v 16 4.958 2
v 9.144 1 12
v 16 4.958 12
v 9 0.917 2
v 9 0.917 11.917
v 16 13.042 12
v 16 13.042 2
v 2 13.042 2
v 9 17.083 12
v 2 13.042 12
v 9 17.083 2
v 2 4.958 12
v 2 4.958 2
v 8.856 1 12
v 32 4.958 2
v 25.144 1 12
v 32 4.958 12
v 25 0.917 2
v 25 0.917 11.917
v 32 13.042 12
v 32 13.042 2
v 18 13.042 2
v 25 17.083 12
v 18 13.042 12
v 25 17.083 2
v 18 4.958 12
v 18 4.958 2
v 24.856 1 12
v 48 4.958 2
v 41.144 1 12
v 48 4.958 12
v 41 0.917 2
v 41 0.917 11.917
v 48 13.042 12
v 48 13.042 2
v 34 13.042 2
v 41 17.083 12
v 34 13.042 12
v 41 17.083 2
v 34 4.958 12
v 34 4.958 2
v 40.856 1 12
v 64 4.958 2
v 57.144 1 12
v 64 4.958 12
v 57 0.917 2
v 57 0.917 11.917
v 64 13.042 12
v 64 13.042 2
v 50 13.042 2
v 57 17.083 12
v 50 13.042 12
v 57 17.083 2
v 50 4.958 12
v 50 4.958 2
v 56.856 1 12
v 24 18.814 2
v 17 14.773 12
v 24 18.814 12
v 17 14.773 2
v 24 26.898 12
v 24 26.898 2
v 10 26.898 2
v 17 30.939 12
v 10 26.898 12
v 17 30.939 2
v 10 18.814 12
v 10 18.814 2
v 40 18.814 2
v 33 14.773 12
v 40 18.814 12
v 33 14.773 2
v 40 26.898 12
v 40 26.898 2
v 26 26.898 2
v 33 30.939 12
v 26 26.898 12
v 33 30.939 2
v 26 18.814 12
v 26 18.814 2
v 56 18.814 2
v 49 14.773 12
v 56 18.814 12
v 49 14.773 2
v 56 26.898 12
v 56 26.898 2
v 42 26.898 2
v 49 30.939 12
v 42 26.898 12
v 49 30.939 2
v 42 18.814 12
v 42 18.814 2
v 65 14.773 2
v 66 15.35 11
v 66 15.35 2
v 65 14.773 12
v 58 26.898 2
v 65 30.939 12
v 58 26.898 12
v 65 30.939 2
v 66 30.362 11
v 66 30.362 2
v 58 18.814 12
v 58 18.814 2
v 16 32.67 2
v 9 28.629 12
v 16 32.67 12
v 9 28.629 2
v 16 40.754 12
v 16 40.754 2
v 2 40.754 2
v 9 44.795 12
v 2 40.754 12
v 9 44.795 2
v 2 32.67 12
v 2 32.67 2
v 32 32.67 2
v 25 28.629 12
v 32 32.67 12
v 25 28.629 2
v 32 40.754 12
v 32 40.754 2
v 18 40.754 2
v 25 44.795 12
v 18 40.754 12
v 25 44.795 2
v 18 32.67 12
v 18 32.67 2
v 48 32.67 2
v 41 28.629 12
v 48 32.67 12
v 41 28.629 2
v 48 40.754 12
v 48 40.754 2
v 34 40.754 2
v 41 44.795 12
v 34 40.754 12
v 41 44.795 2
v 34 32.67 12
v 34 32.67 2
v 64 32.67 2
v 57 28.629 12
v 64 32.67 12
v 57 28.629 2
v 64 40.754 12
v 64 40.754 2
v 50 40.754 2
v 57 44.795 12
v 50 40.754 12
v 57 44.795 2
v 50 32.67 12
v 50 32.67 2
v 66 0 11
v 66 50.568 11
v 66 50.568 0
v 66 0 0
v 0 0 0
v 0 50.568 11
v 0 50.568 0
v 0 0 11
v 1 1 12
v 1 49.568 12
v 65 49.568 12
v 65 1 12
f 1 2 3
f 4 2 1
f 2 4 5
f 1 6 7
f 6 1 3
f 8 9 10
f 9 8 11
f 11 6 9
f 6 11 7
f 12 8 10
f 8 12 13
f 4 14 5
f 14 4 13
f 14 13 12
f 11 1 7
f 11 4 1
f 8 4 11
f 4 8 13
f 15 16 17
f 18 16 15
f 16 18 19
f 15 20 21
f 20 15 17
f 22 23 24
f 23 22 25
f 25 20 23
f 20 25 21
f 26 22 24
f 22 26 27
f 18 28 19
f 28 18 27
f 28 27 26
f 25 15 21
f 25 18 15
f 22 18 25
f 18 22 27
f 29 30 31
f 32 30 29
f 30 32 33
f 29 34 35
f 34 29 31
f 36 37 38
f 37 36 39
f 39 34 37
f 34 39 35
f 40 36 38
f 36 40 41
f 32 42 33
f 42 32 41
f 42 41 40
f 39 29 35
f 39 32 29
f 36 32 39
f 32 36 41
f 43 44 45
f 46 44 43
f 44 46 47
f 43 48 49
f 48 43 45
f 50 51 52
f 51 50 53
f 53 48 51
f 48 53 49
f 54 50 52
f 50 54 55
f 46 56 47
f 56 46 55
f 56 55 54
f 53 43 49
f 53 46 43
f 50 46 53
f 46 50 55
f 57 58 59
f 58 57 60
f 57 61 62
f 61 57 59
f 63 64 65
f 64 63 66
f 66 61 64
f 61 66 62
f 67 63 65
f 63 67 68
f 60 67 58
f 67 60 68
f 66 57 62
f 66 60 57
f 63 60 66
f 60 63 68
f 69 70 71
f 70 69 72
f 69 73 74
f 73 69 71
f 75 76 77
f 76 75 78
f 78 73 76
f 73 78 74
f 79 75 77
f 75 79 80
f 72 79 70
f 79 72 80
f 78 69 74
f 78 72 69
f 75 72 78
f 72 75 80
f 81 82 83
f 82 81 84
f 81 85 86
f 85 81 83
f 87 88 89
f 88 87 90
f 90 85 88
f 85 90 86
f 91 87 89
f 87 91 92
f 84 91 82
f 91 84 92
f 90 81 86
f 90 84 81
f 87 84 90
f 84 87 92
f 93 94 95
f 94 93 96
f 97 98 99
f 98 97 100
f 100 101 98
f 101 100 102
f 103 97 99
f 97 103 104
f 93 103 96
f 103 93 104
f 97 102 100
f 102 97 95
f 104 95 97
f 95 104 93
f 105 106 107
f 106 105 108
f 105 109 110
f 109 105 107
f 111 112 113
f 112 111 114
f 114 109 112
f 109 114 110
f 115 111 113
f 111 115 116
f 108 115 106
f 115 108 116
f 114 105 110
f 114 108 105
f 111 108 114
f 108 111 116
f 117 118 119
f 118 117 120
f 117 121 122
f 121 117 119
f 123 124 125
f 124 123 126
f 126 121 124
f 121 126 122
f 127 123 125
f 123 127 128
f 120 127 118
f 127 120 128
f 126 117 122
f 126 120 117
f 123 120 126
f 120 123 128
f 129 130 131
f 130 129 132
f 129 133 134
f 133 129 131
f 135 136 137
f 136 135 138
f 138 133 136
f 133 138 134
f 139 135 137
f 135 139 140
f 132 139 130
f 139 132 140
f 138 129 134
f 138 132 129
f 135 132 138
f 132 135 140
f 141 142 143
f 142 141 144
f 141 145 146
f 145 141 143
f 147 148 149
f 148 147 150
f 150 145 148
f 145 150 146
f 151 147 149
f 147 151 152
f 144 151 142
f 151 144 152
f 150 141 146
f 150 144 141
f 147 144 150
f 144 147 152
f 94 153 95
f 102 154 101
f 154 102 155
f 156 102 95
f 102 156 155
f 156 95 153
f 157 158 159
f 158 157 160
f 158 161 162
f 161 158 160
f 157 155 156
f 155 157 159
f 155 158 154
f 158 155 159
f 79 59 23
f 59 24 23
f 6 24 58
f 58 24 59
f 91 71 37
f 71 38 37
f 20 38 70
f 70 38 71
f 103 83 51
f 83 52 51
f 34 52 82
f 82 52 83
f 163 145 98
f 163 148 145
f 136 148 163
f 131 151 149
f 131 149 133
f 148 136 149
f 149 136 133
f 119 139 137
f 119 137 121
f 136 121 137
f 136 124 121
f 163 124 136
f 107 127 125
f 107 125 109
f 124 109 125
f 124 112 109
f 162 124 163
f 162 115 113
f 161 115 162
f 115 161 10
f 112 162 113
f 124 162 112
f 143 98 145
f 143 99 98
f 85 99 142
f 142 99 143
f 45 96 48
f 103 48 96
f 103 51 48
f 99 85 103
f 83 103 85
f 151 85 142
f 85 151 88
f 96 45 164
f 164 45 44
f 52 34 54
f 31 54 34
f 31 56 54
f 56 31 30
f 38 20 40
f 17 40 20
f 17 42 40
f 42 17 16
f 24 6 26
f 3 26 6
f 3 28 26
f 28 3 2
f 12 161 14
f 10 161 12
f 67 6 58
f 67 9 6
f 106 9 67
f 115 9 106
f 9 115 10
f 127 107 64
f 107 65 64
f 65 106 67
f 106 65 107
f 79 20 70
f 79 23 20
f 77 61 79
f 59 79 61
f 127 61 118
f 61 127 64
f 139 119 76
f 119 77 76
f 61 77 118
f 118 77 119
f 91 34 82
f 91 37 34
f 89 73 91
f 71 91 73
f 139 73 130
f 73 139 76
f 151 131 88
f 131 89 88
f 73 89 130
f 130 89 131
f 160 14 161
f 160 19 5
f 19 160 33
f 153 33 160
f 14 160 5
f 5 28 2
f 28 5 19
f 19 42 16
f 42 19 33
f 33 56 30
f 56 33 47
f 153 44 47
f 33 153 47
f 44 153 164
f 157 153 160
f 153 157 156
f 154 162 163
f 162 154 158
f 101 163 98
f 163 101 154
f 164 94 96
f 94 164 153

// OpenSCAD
// A tray of hexagonal pockets for small parts. Plain OpenSCAD, no libraries.
cols = 4;
rows = 3;
across = 14;     // pocket across flats
depth = 10;
wall = 2;
floor_t = 2;
rim = 1;         // chamfer on the top edge

pitch_x = across + wall;
pitch_y = (across + wall) * 0.866;
size_x = cols * pitch_x + wall;
size_y = rows * pitch_y + across * 0.5 + wall;

module pocket() {
    rotate([0, 0, 30]) cylinder(d = across / 0.866, h = depth + 1, $fn = 6);
}

difference() {
    hull() {
        cube([size_x, size_y, depth + floor_t - rim]);
        translate([rim, rim, 0]) cube([size_x - 2 * rim, size_y - 2 * rim, depth + floor_t]);
    }
    for (r = [0 : rows - 1]) for (c = [0 : cols - 1])
        translate([wall + across / 2 + c * pitch_x + (r % 2) * pitch_x / 2, wall + across / 2 + r * pitch_y, floor_t])
            pocket();
}
